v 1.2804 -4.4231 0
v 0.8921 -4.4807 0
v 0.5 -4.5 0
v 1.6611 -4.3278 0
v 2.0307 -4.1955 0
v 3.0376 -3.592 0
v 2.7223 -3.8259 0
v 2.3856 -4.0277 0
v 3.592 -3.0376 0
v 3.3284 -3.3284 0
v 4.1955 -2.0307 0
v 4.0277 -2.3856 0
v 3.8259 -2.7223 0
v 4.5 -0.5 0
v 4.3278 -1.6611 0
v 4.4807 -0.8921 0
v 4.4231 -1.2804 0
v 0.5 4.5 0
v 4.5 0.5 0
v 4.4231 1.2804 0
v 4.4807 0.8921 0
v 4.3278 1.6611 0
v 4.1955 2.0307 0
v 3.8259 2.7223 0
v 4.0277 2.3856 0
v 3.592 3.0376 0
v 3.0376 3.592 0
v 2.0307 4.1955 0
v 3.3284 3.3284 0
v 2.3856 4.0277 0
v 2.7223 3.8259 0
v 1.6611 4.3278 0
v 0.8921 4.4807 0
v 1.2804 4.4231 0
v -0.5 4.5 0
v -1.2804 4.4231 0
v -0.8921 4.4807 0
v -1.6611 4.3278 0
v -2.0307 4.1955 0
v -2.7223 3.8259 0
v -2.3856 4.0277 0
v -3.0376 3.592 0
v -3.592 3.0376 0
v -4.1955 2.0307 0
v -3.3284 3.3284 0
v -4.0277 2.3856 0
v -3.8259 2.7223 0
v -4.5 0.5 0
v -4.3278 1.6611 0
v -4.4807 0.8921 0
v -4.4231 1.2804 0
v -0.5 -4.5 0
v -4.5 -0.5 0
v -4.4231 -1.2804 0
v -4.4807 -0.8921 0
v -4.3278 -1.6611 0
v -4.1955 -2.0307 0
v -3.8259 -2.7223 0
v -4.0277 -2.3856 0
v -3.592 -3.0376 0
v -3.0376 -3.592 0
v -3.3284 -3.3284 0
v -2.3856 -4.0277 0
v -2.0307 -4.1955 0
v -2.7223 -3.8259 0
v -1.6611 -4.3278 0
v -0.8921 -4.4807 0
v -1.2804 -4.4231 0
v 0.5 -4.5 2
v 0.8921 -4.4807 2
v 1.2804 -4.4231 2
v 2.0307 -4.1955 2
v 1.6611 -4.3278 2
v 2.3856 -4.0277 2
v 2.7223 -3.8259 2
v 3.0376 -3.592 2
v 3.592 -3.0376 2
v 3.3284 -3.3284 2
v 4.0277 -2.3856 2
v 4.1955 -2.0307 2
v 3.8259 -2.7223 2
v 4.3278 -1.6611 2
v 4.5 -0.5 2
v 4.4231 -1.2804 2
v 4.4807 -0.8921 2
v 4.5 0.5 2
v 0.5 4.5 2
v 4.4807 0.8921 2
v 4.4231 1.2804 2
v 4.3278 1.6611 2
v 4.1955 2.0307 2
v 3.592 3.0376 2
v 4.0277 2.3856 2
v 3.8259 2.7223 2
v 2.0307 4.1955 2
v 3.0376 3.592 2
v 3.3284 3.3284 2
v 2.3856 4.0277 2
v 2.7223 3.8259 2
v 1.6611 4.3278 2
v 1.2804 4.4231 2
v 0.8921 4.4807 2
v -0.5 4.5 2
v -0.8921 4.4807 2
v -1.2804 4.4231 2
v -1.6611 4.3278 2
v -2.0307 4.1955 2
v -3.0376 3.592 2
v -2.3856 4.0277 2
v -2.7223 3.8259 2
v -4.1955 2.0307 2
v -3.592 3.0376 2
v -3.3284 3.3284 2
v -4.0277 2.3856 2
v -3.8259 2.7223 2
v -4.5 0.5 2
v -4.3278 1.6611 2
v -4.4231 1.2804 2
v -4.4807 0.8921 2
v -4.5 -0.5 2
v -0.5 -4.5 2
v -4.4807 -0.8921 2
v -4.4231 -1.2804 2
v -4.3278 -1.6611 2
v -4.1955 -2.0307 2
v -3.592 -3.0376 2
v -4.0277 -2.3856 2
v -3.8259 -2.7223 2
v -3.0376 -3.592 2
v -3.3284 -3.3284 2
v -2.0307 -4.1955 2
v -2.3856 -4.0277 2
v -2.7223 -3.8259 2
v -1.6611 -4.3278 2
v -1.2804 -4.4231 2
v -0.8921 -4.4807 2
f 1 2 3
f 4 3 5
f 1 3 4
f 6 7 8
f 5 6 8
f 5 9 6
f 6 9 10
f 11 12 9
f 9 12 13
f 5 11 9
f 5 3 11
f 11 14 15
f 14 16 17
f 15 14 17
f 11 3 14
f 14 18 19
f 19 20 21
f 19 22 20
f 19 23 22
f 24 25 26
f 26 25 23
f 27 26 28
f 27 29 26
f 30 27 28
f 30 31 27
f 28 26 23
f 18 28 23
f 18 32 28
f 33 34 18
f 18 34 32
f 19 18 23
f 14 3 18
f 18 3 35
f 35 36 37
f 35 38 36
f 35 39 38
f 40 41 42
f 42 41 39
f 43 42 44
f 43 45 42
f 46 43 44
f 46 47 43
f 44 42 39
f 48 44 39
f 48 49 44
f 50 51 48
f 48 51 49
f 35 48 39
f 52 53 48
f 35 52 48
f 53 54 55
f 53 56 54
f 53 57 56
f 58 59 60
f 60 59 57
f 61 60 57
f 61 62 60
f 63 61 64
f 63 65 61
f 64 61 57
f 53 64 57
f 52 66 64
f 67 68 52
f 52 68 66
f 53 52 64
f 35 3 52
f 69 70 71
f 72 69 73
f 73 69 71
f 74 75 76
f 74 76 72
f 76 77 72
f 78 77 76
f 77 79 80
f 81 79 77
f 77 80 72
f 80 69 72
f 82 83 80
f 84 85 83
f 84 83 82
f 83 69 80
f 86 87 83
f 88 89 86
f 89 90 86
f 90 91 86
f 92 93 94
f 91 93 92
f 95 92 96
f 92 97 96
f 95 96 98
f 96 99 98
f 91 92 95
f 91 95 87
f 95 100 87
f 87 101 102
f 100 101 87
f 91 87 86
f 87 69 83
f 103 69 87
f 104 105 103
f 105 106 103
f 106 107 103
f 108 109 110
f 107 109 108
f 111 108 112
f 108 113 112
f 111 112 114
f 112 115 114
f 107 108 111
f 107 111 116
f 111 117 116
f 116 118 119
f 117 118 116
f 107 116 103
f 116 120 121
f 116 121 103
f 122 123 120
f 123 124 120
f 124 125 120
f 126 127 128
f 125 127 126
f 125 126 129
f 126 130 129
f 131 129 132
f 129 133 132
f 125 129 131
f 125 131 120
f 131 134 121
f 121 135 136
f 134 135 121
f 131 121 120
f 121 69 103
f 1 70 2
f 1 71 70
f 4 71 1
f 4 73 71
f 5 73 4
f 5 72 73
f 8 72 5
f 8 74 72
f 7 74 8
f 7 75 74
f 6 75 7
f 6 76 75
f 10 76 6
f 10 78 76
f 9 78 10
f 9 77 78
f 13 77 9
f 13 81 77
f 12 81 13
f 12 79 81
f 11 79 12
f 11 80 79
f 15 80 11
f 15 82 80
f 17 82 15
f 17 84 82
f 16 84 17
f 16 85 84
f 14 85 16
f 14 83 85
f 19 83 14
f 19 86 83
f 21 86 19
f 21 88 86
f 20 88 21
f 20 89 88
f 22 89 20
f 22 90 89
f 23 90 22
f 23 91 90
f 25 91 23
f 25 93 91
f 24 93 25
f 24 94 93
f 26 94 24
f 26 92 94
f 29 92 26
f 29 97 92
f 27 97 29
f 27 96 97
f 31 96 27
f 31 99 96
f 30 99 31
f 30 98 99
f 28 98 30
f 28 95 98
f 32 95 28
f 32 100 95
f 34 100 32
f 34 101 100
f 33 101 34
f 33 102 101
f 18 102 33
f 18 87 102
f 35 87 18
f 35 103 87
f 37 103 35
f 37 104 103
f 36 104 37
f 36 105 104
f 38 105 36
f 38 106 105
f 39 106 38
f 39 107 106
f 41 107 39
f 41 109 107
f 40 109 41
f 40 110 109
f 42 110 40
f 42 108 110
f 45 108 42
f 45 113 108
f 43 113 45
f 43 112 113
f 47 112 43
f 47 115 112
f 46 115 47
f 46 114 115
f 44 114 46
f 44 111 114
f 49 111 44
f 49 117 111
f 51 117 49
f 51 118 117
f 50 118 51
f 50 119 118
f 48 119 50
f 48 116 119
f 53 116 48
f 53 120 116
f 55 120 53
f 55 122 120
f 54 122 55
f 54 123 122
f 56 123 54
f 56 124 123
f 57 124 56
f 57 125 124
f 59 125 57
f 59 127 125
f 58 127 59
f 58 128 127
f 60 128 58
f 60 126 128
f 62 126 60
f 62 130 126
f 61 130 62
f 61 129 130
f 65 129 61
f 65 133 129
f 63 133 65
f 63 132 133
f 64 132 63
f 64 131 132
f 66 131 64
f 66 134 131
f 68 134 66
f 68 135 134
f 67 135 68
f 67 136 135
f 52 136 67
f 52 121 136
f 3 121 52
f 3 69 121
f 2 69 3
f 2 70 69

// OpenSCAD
// file: lib/logo_plaque.scad
// Raised multi-color logo on a rounded base.
//
//   side view
//
//        ▄▄▄  ▒▒▒▒   ░░    ← logo layers, one per filament
//   ▐████████████████████▌ ← base
//
// Every layer SVG shares one pixel frame, so the layers line up without
// centering each one (centering would use each layer's own outline).

$fn = 64;

BASE_HEIGHT = 2;
LOGO_HEIGHT = 1.2;
BORDER = 3;
CORNER_RADIUS = 4;
AVATAR_FN = 180;
MARK_HEIGHT = 4;
TIE_HEIGHT = 1.2;

// potrace writes one point per pixel, and OpenSCAD reads points as 1/72 inch
MM_PER_FRAME_PX = 25.4 / 72;

module layer_2d(dir, name, frame, width) {
    scale(width / (frame.x * MM_PER_FRAME_PX))
        translate([-frame.x / 2, -frame.y / 2] * MM_PER_FRAME_PX)
            import(str(dir, "/", name, ".svg"));
}

// Earlier layers win where traced outlines overlap, so no two parts share volume.
module clipped_layer_2d(dir, layers, index, frame, width) {
    difference() {
        layer_2d(dir, layers[index][0], frame, width);

        for (earlier = [0:1:index - 1]) {
            layer_2d(dir, layers[earlier][0], frame, width);
        }
    }
}

module rounded_base_2d(frame, width, border, corner_radius) {
    height = width * frame.y / frame.x;

    offset(r = corner_radius)
        square(
            [
                width + (border - corner_radius) * 2,
                height + (border - corner_radius) * 2,
            ],
            center = true
        );
}

// `part` selects one filament for export: "base", a layer name, or "all".
// With `diameter`, the base is a circle instead of a rounded rectangle.
module logo_plaque(
    dir,
    frame,
    width,
    base_color,
    layers,
    part = "all",
    base_height = BASE_HEIGHT,
    logo_height = LOGO_HEIGHT,
    border = BORDER,
    corner_radius = CORNER_RADIUS,
    diameter = undef
) {
    if (part == "all" || part == "base") {
        color(base_color)
            linear_extrude(height = base_height)
                if (is_undef(diameter)) {
                    rounded_base_2d(frame, width, border, corner_radius);
                } else {
                    circle(d = diameter, $fn = AVATAR_FN);
                }
    }

    for (index = [0:1:len(layers) - 1]) {
        if (part == "all" || part == layers[index][0]) {
            color(layers[index][1])
                translate([0, 0, base_height])
                    linear_extrude(height = logo_height)
                        clipped_layer_2d(dir, layers, index, frame, width);
        }
    }
}

// The logo extruded with no base.
//
//   side view
//
//   ████  ████   ▒▒▒▒ ← layers at full height
//   ████▁▁████▁▁▁▒▒▒▒ ← low ties join loose pieces
//
// Each layer is [name, color, has_ties]. Ties are in "<name>_ties.svg", and stop
// at other layers so that no two parts share volume.
//
// With `back_color`, one more filament joins the pieces. The ties, in "ties.svg",
// and the logo's outline form a back layer, and the logo sits on top of it:
//
//   ████  ████   ▒▒▒▒
//   ▄▄▄▄▄▄▄▄▄▄▄▄▄▄▄▄▄ ← back layer, `tie_height` thick
//
// `part` selects one filament for export: "back", a layer name, or "all".
module logo_mark(
    dir,
    frame,
    width,
    layers,
    part = "all",
    height = MARK_HEIGHT,
    tie_height = TIE_HEIGHT,
    back_color = undef,
    back_has_ties = false
) {
    has_back = !is_undef(back_color);
    logo_z = has_back ? tie_height : 0;

    if (has_back && (part == "all" || part == "back")) {
        color(back_color)
            linear_extrude(height = tie_height) {
                for (layer = layers) {
                    layer_2d(dir, layer[0], frame, width);
                }

                if (back_has_ties) {
                    layer_2d(dir, "ties", frame, width);
                }
            }
    }

    for (index = [0:1:len(layers) - 1]) {
        name = layers[index][0];

        if (part == "all" || part == name) {
            color(layers[index][1]) {
                translate([0, 0, logo_z])
                    linear_extrude(height = height - logo_z)
                        clipped_layer_2d(dir, layers, index, frame, width);

                if (layers[index][2]) {
                    linear_extrude(height = tie_height)
                        difference() {
                            layer_2d(dir, str(name, "_ties"), frame, width);

                            for (other = layers) {
                                if (other[0] != name) {
                                    layer_2d(dir, other[0], frame, width);
                                }
                            }
                        }
                }
            }
        }
    }
}
// main file
use <lib/logo_plaque.scad>

logo_plaque("logos/interflexion.svg", base_style = "rect");
